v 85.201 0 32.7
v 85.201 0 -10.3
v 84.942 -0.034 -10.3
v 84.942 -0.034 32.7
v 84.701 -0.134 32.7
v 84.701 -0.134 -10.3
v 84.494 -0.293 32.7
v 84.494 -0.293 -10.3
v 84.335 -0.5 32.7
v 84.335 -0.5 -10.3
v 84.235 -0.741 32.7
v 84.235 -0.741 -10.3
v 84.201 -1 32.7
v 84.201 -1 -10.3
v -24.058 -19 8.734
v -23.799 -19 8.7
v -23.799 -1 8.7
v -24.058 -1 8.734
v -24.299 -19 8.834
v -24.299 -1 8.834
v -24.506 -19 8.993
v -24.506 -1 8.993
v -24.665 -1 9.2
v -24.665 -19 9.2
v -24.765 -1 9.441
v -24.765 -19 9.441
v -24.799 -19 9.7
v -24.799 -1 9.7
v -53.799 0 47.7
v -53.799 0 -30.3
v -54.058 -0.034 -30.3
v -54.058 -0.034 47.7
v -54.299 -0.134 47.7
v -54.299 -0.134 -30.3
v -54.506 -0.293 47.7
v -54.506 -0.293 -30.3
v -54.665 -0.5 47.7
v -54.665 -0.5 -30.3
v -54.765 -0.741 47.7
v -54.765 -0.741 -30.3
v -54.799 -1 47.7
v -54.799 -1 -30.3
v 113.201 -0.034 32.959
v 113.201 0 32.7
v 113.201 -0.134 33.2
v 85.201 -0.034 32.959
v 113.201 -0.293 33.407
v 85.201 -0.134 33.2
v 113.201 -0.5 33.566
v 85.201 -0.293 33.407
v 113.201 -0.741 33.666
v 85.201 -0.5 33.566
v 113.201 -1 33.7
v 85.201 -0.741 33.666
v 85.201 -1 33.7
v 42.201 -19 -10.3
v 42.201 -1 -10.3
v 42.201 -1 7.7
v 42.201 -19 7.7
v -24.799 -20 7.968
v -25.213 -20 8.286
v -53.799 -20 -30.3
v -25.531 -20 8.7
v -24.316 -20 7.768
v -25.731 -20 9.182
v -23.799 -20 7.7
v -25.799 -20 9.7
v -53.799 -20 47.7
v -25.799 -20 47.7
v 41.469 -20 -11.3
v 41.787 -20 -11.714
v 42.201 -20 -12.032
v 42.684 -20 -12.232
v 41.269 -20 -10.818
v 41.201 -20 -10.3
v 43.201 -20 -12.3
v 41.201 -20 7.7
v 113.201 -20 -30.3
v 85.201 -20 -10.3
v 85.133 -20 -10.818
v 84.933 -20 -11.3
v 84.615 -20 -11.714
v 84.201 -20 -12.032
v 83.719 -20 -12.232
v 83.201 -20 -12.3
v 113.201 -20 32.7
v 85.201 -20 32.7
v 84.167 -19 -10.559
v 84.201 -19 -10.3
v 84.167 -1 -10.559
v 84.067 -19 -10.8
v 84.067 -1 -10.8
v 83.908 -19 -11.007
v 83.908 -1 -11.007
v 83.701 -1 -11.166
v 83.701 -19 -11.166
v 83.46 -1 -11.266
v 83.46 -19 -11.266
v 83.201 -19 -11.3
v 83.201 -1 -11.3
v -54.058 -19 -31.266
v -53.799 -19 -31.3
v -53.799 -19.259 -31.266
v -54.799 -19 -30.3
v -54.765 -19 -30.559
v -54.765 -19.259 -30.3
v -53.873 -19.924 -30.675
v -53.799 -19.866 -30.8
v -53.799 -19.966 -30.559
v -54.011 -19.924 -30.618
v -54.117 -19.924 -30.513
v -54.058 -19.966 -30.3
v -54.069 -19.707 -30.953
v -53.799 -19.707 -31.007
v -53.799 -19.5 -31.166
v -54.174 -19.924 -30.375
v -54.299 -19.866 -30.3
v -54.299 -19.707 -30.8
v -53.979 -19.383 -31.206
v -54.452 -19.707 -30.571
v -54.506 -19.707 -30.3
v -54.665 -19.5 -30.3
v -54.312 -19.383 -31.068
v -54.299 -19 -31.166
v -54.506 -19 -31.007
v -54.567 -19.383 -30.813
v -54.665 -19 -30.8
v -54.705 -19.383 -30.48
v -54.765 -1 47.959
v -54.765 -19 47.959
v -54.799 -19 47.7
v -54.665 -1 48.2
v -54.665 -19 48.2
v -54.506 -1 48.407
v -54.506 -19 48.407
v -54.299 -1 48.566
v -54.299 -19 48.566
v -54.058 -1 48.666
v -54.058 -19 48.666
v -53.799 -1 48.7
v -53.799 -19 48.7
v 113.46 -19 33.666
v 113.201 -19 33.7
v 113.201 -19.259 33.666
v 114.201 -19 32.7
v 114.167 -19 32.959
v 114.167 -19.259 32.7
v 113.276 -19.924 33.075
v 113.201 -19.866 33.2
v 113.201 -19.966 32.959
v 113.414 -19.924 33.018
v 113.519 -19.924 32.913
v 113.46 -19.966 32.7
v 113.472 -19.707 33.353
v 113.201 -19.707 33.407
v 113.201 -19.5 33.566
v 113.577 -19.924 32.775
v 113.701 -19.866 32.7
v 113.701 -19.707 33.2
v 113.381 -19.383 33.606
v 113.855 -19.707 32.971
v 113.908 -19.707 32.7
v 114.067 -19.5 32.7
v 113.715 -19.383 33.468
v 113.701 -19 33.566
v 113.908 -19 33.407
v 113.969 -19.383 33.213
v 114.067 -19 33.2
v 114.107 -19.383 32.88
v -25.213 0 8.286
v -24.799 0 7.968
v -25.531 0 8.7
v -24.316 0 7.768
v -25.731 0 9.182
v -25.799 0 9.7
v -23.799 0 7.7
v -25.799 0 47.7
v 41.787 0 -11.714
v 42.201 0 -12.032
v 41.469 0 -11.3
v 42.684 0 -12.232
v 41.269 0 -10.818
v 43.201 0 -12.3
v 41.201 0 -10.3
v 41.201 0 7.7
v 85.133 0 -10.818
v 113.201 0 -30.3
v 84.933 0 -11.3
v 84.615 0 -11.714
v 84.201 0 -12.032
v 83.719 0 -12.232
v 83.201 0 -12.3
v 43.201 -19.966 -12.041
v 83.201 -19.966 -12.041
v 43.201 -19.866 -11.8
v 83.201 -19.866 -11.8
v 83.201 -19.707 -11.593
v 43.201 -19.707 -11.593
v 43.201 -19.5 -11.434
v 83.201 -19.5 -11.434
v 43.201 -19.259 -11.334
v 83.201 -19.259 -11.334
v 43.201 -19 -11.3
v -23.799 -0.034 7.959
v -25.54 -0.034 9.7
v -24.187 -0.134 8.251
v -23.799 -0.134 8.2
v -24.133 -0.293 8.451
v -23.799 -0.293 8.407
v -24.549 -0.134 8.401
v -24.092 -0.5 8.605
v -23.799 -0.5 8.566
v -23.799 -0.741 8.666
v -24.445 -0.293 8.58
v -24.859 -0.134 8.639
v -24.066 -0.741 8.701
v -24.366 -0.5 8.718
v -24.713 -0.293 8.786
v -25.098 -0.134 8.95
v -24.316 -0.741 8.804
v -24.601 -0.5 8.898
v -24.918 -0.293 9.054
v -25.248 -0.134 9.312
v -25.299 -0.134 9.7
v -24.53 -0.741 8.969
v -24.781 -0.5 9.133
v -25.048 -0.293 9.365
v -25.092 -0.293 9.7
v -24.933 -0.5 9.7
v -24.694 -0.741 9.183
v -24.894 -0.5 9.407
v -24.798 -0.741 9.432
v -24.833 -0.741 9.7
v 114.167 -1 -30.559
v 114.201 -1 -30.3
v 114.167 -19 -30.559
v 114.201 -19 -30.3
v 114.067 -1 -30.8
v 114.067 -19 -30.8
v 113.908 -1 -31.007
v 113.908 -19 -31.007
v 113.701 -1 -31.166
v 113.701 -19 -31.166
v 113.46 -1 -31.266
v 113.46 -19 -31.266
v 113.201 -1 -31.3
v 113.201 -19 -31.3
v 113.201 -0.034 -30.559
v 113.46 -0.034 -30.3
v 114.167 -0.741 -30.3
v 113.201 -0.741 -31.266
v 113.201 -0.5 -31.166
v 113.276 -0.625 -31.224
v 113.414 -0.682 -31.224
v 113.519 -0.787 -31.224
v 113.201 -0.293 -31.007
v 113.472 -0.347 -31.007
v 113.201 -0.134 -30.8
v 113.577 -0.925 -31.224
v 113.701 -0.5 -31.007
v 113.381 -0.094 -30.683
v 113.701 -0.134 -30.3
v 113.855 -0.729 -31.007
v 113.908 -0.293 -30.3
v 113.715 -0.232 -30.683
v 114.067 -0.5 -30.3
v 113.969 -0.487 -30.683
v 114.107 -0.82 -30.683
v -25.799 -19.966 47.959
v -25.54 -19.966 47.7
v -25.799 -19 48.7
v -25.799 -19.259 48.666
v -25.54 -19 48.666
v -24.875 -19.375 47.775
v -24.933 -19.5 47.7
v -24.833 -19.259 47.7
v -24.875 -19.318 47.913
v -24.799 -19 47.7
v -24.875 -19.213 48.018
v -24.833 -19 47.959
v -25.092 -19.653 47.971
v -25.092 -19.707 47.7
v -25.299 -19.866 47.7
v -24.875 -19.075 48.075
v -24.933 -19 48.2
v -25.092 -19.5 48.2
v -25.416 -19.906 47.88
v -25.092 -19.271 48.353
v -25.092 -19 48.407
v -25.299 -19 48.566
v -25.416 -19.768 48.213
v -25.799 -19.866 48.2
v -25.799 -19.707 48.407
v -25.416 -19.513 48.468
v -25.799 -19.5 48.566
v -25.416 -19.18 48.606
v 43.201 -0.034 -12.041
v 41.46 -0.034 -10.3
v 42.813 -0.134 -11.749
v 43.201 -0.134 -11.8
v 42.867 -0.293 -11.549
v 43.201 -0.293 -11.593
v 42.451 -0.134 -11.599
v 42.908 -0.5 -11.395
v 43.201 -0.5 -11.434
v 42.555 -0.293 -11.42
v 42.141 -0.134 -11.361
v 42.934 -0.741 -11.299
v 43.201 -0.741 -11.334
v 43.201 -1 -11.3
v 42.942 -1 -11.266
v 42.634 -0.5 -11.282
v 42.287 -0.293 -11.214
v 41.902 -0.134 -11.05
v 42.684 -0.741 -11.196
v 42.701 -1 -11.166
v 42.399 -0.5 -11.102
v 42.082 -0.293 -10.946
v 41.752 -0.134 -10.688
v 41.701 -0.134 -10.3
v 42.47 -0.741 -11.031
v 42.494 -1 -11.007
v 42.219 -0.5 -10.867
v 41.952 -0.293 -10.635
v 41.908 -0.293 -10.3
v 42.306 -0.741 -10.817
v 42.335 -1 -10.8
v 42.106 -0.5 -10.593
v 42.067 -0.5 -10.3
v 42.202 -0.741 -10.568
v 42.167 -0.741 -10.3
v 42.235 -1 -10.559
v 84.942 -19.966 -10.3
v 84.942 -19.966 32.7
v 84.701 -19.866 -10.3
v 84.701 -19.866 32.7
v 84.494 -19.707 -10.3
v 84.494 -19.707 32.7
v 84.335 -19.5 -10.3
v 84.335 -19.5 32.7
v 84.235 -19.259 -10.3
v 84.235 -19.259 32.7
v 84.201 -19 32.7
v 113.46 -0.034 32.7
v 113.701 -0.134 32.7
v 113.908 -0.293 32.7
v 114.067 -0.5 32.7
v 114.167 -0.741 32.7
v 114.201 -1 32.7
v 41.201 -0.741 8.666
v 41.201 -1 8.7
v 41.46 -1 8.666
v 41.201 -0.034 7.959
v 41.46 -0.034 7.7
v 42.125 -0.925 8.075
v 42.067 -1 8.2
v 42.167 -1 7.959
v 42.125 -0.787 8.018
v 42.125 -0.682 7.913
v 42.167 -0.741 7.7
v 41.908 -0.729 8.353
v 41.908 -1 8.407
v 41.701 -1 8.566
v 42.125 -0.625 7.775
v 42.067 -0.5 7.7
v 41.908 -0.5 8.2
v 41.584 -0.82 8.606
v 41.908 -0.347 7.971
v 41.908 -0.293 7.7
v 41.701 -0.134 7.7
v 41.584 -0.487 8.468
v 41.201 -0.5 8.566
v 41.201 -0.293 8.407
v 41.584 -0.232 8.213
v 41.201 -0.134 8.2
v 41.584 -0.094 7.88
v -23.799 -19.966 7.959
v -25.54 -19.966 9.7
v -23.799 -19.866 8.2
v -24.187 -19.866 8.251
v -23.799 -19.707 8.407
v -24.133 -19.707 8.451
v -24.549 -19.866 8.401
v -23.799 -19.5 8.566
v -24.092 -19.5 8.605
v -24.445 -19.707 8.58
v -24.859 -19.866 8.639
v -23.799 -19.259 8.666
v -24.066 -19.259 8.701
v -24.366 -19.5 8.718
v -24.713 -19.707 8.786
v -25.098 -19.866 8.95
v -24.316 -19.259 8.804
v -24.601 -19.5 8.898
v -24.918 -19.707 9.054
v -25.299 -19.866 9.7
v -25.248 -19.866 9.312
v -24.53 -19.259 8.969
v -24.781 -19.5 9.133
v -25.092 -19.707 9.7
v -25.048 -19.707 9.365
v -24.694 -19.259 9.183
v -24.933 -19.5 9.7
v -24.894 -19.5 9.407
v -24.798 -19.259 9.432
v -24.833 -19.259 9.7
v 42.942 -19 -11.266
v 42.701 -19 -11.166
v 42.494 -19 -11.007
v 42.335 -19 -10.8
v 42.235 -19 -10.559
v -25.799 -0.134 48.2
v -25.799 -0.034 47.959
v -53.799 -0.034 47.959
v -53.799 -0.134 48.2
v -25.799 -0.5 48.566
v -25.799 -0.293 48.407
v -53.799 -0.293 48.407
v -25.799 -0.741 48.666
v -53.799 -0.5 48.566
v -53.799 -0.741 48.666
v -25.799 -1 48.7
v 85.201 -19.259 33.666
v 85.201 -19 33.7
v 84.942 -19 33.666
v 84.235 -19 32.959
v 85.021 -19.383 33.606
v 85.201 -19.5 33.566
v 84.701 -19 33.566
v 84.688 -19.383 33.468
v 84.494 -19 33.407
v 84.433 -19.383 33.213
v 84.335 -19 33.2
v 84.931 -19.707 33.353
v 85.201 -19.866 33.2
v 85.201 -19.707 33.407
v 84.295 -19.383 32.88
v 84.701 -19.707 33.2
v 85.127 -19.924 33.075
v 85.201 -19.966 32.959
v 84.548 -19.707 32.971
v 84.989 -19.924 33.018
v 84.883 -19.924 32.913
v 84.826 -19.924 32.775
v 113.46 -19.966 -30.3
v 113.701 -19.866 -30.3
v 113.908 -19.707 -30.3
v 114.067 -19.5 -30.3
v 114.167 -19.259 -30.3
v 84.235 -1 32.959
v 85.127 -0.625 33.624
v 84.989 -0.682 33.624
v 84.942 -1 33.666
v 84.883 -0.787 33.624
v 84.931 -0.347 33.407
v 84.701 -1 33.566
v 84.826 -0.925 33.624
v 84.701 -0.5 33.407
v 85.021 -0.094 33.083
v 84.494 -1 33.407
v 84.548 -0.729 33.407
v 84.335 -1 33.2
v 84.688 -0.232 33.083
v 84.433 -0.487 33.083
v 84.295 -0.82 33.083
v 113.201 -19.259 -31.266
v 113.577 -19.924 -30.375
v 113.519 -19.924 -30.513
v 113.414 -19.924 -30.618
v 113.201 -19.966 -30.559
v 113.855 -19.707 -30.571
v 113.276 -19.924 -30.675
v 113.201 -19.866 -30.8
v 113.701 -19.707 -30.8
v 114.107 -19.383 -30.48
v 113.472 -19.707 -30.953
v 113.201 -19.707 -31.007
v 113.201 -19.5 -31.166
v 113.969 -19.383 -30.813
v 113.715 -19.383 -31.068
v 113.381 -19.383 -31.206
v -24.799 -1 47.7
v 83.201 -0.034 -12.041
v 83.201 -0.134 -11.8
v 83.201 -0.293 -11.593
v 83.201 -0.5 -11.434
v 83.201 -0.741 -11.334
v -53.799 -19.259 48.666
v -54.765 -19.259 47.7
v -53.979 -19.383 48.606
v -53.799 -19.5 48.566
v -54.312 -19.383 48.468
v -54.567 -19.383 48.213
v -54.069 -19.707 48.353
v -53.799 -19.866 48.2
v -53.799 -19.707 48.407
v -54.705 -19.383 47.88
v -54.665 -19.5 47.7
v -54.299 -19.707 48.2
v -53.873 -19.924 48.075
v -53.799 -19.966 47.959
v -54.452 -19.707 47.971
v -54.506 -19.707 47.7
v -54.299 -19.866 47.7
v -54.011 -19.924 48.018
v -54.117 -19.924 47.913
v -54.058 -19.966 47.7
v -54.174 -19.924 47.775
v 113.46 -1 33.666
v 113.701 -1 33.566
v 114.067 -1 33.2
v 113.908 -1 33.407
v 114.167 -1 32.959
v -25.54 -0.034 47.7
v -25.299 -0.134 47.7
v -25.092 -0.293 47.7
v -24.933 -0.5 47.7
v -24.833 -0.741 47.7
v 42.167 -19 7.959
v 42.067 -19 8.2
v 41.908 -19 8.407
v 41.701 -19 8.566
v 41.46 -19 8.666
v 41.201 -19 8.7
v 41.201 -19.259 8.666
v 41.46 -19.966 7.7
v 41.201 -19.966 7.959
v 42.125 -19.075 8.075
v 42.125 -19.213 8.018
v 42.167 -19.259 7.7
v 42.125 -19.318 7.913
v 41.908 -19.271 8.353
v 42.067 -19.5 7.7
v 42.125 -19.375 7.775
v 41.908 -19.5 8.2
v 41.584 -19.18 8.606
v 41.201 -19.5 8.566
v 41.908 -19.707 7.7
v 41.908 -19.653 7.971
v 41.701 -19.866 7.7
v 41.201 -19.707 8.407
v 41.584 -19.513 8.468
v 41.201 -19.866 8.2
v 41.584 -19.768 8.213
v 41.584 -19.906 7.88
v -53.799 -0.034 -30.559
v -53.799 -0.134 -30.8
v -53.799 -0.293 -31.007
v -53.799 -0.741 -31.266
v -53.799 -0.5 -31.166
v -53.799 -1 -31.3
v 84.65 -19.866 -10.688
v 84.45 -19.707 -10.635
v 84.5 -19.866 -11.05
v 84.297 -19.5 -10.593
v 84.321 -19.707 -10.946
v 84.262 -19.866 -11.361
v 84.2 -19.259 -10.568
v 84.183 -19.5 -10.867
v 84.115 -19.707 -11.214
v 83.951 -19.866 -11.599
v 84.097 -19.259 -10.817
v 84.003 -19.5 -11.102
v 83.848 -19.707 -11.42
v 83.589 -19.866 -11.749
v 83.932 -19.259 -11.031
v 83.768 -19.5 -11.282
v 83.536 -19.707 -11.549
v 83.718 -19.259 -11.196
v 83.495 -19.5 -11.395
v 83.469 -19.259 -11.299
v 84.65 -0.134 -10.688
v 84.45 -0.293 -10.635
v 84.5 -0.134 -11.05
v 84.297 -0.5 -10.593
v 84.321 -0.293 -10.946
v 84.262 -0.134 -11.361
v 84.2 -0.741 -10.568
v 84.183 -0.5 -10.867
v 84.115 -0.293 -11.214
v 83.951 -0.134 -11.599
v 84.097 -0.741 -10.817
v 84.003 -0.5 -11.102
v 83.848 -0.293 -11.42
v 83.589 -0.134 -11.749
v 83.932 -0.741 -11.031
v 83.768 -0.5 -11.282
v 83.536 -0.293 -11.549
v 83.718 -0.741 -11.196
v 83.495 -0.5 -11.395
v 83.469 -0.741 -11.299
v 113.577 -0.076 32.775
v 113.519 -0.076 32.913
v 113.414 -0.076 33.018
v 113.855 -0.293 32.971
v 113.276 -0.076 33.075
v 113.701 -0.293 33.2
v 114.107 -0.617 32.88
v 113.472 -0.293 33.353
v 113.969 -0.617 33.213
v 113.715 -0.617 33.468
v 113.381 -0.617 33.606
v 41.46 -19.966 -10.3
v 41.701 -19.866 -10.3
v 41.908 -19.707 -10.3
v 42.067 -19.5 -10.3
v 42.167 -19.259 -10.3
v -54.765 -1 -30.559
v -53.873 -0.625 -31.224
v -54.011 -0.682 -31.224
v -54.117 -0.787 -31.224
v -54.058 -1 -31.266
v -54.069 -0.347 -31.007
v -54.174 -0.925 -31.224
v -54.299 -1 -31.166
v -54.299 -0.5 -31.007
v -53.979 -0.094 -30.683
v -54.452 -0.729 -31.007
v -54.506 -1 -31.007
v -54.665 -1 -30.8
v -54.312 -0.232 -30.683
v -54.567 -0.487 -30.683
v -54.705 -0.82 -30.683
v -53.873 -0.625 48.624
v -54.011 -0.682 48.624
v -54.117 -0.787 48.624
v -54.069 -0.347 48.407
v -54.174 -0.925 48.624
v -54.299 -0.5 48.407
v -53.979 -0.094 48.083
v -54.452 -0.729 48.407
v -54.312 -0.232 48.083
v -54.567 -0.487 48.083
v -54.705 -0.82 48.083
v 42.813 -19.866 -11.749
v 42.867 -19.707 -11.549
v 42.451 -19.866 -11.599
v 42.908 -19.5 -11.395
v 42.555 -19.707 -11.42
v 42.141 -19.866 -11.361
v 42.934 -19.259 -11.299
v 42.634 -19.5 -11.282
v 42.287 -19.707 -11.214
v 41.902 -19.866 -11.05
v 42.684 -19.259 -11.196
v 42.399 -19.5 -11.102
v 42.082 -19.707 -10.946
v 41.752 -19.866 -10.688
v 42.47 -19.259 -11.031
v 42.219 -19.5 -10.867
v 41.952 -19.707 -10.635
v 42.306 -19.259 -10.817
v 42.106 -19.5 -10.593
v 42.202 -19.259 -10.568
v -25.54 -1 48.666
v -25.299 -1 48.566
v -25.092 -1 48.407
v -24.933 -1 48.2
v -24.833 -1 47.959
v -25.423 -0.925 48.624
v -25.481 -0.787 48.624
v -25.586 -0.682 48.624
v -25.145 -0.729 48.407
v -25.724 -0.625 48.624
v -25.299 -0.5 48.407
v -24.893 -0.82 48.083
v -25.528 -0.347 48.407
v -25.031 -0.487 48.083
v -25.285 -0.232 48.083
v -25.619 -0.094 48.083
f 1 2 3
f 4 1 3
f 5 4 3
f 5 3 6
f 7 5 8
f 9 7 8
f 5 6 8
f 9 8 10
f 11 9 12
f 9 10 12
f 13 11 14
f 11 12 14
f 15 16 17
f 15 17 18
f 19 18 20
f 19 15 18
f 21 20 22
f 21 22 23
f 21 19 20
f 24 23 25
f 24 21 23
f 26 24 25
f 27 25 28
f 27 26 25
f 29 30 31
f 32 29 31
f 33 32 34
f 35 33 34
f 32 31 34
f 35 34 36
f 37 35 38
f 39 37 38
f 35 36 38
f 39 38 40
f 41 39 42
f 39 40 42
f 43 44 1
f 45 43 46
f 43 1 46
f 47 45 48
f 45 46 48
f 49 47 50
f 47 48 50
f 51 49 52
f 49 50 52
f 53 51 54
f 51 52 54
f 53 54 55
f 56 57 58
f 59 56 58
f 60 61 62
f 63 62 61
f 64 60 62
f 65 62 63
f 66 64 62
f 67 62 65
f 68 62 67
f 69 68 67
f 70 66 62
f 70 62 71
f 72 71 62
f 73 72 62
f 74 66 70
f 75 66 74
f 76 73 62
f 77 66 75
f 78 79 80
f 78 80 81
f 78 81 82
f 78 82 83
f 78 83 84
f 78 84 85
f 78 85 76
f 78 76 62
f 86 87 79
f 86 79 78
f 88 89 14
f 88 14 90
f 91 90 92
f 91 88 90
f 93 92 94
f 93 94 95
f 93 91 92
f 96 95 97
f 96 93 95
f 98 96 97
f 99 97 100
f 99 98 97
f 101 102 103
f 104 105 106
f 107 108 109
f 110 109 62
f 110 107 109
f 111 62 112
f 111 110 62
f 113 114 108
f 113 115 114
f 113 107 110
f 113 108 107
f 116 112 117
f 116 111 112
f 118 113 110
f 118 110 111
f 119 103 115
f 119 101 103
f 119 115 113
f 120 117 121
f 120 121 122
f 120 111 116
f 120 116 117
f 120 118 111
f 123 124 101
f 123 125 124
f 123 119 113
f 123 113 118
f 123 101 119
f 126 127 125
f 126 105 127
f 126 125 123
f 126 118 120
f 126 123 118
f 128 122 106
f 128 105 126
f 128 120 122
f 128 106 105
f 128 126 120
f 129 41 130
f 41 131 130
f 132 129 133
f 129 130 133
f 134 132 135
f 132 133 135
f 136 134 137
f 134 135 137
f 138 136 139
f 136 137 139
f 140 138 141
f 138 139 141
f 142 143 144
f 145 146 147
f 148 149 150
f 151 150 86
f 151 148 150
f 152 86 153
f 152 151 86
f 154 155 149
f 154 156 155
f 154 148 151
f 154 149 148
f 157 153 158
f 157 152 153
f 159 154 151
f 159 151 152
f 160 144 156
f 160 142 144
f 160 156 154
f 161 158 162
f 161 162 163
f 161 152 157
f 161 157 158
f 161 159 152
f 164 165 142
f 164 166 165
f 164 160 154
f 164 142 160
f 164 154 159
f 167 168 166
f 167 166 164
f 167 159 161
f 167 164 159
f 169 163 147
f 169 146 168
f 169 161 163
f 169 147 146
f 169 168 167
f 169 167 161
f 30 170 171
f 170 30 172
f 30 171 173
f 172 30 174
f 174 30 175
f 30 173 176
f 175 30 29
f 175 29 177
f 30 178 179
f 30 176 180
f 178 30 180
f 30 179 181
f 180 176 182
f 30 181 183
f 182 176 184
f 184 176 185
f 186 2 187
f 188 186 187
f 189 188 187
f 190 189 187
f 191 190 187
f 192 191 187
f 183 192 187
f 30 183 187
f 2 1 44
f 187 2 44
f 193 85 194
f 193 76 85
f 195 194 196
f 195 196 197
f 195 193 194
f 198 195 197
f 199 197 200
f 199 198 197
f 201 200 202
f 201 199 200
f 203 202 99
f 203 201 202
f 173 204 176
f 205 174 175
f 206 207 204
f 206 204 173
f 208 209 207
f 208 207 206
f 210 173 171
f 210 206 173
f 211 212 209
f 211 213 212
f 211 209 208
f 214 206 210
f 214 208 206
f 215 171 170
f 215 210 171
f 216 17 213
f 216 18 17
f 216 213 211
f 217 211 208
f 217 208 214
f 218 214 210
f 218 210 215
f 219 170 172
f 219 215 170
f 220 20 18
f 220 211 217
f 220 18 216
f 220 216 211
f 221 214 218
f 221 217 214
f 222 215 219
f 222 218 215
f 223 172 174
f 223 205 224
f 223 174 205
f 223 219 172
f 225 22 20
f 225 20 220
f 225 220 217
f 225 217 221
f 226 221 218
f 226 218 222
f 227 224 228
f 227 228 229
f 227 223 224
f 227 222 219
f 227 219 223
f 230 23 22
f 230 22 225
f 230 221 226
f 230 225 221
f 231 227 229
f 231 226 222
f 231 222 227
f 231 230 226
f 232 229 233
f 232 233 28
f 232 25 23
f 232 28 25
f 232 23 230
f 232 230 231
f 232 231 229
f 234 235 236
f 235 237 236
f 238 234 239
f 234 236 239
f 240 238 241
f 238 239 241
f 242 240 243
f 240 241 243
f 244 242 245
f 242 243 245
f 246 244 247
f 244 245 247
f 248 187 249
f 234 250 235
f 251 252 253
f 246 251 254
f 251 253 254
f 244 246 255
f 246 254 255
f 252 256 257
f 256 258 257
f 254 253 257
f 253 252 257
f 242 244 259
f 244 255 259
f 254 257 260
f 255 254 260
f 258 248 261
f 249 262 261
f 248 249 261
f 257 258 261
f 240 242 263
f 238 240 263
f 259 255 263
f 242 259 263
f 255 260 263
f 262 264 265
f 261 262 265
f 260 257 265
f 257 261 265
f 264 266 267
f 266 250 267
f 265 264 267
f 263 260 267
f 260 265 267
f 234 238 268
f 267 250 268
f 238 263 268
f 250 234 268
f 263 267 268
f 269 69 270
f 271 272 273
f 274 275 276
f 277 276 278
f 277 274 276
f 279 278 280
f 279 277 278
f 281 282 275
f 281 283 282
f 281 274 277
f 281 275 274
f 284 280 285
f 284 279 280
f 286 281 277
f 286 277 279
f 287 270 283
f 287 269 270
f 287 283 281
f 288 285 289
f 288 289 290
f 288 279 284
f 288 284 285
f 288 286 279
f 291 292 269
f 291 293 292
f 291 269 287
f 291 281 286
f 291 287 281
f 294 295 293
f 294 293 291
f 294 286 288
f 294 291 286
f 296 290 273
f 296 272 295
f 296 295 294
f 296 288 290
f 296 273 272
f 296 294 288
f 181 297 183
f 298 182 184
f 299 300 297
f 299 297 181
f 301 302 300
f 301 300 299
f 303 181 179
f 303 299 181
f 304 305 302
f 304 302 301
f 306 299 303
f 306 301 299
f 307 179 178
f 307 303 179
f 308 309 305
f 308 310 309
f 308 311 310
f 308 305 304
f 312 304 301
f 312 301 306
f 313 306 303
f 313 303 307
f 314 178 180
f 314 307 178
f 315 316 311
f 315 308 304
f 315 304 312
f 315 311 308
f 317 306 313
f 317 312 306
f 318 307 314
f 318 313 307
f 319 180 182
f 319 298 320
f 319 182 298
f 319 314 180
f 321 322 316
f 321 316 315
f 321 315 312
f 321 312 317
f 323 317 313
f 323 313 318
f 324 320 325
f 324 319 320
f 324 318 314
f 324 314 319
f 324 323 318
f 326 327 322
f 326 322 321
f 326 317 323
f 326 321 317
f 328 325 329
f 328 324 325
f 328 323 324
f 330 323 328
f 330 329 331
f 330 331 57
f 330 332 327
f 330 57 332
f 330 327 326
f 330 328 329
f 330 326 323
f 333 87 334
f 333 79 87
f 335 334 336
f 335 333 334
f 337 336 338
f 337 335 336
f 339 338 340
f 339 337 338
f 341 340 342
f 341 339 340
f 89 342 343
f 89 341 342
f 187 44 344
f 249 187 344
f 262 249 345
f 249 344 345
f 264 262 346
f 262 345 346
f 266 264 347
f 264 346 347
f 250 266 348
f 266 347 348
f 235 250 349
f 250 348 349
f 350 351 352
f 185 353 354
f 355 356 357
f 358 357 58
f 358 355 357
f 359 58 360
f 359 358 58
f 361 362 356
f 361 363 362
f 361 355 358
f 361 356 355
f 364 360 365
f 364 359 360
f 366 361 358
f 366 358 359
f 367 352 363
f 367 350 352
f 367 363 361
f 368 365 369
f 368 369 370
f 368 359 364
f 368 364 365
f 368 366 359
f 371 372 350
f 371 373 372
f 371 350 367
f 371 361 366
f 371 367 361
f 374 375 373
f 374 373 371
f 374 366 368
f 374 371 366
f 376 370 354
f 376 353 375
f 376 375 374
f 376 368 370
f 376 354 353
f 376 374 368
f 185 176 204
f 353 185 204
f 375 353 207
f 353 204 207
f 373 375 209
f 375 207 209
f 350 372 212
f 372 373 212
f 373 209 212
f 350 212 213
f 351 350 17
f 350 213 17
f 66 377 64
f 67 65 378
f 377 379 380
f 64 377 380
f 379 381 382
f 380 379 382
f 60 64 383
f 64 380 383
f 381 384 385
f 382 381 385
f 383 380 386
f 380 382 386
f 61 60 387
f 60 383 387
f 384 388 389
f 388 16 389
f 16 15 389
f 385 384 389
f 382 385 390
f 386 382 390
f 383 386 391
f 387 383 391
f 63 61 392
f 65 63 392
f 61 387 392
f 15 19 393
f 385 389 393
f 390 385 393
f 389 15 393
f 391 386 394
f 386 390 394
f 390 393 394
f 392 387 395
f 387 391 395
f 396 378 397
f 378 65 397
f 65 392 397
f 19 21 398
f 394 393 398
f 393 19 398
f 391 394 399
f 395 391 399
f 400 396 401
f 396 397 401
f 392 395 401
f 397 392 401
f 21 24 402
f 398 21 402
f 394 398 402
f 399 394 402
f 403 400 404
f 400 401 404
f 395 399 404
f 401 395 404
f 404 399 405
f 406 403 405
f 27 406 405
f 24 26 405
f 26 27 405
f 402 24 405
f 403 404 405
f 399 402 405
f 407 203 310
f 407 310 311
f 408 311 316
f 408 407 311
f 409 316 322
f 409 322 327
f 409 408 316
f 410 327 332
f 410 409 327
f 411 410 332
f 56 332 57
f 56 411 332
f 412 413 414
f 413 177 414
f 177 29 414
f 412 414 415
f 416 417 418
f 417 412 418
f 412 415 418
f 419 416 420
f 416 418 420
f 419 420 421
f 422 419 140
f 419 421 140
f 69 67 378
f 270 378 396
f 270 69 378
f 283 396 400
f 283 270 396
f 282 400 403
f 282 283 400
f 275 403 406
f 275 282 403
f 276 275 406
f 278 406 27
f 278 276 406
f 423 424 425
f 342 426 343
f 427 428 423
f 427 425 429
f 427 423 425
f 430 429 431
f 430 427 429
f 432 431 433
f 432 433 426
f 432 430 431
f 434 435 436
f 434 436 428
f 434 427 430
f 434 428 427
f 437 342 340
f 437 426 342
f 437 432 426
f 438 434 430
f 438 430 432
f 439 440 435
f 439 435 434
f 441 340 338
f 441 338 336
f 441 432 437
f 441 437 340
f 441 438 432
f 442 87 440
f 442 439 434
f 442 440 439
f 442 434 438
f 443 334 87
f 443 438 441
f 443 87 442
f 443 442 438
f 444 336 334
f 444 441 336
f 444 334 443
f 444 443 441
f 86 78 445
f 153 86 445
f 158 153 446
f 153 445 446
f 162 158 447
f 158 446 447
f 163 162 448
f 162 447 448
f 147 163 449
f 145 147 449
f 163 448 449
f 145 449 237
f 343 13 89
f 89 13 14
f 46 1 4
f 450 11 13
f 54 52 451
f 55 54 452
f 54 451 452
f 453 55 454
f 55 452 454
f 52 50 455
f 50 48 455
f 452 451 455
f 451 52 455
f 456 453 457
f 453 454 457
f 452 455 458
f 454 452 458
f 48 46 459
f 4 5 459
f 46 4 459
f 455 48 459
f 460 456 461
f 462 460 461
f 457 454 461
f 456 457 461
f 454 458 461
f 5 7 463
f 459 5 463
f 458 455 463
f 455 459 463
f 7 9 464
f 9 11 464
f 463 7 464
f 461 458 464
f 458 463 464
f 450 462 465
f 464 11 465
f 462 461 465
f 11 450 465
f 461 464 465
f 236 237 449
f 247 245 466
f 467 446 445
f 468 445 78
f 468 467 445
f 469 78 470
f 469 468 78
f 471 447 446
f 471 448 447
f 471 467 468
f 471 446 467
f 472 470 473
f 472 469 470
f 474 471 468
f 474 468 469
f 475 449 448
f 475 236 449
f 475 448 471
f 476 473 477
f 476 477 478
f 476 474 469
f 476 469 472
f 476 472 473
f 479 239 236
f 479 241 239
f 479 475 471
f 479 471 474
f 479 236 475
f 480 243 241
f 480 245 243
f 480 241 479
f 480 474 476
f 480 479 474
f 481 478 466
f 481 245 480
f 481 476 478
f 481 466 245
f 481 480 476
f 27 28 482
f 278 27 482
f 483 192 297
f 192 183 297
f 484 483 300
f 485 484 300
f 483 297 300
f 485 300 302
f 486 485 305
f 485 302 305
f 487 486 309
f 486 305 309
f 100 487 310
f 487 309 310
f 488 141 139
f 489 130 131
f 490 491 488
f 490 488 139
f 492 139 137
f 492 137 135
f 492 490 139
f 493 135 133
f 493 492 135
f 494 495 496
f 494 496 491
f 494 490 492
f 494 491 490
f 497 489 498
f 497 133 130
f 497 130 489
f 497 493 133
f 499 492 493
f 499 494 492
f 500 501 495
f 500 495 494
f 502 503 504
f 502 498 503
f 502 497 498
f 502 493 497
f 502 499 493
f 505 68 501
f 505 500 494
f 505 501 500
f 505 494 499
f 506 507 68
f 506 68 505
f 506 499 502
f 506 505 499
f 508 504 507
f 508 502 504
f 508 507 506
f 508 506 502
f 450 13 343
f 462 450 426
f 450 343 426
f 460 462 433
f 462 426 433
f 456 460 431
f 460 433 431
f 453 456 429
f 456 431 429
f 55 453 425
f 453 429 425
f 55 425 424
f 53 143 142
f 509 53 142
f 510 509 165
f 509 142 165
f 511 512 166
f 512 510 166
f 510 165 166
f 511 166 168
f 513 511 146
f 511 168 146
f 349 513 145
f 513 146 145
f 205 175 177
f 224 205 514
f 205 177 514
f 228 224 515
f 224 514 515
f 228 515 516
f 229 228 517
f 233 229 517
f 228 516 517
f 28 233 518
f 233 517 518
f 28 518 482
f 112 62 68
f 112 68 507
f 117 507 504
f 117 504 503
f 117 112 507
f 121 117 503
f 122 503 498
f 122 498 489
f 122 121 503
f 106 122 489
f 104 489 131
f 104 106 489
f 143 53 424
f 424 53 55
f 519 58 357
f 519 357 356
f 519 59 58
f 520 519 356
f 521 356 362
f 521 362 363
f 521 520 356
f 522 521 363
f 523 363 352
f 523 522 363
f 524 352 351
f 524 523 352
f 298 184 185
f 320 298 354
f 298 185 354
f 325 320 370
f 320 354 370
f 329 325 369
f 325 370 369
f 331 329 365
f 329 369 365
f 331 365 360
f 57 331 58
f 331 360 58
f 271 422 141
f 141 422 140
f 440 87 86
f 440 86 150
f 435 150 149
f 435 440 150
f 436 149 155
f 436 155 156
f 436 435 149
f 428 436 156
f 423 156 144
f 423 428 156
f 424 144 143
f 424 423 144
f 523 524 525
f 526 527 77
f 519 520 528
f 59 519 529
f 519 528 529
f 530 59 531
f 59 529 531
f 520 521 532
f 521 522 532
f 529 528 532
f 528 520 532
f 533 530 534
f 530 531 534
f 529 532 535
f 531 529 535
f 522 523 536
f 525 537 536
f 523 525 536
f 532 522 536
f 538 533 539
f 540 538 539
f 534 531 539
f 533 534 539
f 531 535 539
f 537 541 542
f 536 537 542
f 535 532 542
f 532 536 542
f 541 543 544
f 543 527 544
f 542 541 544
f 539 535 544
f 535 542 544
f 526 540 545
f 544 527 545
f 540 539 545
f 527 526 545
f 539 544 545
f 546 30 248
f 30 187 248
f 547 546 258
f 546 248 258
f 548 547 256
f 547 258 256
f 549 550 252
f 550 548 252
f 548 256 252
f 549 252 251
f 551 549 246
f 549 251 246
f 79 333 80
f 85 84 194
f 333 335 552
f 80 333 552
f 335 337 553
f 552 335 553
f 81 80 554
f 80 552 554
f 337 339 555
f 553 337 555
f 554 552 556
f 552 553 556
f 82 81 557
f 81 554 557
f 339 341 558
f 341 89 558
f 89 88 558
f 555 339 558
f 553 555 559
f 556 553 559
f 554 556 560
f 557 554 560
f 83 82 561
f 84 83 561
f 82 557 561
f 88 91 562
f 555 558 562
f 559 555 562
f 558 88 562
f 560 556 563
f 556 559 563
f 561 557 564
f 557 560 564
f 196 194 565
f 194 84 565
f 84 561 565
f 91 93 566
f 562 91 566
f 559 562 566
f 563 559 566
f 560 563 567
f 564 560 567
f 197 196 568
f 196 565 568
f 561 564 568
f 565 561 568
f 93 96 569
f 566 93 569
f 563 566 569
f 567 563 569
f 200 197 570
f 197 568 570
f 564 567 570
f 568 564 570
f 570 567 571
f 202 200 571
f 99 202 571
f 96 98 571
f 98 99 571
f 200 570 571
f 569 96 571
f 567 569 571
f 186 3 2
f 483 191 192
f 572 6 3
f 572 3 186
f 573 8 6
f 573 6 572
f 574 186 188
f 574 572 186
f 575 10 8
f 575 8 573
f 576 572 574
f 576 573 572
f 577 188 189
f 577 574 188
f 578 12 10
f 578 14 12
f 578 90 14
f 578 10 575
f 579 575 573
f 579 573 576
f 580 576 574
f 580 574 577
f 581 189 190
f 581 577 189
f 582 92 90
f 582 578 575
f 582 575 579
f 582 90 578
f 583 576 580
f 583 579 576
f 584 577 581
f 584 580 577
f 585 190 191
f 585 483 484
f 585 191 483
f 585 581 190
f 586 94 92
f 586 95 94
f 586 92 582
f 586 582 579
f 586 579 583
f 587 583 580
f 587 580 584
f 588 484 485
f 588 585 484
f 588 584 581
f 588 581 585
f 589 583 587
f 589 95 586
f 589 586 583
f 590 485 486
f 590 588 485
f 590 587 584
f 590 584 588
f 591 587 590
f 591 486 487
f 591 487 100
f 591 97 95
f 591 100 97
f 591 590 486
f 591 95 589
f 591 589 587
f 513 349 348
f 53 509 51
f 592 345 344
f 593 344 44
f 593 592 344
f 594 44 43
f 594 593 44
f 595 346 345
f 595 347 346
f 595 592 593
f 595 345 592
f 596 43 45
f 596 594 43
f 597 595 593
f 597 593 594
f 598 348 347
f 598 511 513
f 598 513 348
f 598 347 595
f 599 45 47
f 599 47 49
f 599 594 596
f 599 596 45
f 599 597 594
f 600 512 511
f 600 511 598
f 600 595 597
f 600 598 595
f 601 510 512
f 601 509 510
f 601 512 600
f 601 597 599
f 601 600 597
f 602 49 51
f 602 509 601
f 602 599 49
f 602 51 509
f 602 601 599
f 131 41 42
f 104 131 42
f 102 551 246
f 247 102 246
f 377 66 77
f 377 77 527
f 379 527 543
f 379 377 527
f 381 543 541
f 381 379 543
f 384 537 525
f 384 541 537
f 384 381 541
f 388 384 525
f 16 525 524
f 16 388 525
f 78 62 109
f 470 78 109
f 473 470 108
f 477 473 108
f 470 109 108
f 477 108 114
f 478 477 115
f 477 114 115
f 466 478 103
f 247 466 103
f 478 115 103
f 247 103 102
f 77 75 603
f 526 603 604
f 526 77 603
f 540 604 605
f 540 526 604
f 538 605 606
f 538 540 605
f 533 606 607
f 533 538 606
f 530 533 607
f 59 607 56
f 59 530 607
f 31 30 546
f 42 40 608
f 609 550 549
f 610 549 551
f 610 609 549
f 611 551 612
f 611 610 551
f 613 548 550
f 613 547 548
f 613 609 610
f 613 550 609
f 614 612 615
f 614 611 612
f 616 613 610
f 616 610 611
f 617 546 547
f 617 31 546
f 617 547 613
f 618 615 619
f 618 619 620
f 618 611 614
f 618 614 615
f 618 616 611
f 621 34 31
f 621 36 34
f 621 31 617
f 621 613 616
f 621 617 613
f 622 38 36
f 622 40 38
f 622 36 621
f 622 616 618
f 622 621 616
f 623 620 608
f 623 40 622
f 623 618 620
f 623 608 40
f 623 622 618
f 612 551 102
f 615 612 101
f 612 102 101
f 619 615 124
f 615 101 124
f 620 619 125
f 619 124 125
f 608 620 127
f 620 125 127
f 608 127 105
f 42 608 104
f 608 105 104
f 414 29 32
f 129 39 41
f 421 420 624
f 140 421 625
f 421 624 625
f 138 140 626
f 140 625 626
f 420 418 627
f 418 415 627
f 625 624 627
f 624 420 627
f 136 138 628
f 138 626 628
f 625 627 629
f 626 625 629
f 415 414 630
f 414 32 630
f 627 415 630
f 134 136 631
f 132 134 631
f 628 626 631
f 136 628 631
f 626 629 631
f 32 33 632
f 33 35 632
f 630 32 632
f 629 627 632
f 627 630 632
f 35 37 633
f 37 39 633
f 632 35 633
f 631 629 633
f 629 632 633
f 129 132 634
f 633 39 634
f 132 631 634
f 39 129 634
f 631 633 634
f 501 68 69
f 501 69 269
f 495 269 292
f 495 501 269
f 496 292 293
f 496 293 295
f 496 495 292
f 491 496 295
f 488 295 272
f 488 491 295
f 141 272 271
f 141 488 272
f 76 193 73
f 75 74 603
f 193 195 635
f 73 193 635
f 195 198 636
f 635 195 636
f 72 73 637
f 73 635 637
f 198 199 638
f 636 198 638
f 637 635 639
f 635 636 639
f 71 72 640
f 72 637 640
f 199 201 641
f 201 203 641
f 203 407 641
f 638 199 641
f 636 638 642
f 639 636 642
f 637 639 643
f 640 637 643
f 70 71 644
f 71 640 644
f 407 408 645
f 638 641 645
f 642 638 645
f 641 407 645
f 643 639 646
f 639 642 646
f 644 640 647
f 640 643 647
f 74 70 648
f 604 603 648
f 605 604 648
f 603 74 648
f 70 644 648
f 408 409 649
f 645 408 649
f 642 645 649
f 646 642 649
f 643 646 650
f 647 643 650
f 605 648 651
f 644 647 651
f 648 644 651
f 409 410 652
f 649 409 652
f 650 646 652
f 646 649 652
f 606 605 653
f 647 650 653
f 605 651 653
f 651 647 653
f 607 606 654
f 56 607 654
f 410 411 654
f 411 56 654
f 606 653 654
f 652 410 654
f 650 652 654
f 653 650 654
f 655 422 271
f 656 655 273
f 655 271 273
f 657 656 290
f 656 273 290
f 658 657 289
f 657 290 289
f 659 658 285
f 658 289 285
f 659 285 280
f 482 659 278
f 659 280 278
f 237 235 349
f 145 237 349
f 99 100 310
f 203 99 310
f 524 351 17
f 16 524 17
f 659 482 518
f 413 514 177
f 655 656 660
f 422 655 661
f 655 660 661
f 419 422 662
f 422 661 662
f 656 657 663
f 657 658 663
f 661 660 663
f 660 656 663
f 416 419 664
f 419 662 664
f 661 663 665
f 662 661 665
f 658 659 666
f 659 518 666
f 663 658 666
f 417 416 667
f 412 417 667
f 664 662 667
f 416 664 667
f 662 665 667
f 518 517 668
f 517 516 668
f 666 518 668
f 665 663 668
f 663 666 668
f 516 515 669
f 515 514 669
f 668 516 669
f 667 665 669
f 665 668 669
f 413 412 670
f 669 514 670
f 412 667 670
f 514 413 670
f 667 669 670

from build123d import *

# Parameters (mm, degrees)
F1_DEPTH     = 20
F2_F1_R      = 1
F2_F2_R      = 1
F3_T1_DEPTH  = 63
F3_T3_DEPTH  = 28
F3_T5_DEPTH  = 167
F3_T7_DEPTH  = 78
F3_S11_W     = 1
F3_S11_H     = 1
F3_T12_DEPTH = 1
F3_S17_W     = 1
F3_S17_H     = 1
F3_T18_DEPTH = 1
F3_T22_ANGLE = 90
F3_T24_ANGLE = 90
F3_T26_ANGLE = 90


# Not quite as in the source:
# - a fillet or chamfer that OpenCascade refuses, or shapes differently, is made with other operations: its cross-section is extruded or revolved along the edge and cut away or added


with BuildPart() as f1:
    # F0 (on Front) → F1 (new body)
    with BuildSketch(Plane.XZ):
        Polygon((-54.7987632453, 48.7000103295), (-54.7987632453, -31.2999896705), (114.2012367547, -31.2999896705), (114.2012367547, 33.7000103295), (84.2012367547, 33.7000103295), (84.2012367547, -11.2999896705), (42.2012367547, -11.2999896705), (42.2012367547, 8.7000103295), (-24.7987632453, 8.7000103295), (-24.7987632453, 48.7000103295), align=None)
    extrude(amount=F1_DEPTH)

    # F2: fillet of radius 1 on 24 edges, made by hand

    # F2_f1
    f2_f1_edges = [f1.edges().sort_by_distance(p)[0] for p in [
        (-24.7987632453, -10, 8.7000103295),
        (84.2012367547, -10, -11.2999896705),
        (42.2012367547, -10, -11.2999896705),
    ]]
    fillet(f2_f1_edges, radius=F2_F1_R)

    # F2_f2
    f2_f2_edges = [f1.edges().sort_by_distance(p)[0] for p in [
        (-39.7987632453, -20, 48.7000103295),
        (9.2012367547, -20, 8.7000103295),
        (-24.7987632453, -20, 29.2000103295),
        (9.2012367547, 0, 8.7000103295),
        (-24.7987632453, -10, 48.7000103295),
        (42.2012367547, -10, 8.7000103295),
        (42.2012367547, -20, -0.7999896705),
        (63.2012367547, 0, -11.2999896705),
        (63.2012367547, -20, -11.2999896705),
        (114.2012367547, -10, 33.7000103295),
        (114.2012367547, 0, 1.2000103295),
        (99.2012367547, 0, 33.7000103295),
        (84.2012367547, 0, 11.7000103295),
        (-54.7987632453, 0, 8.7000103295),
        (29.7012367547, 0, -31.2999896705),
        (-54.7987632453, -10, -31.2999896705),
        (84.2012367547, -10, 33.7000103295),
        (-24.7987632453, 0, 29.2000103295),
        (-39.7987632453, 0, 48.7000103295),
        (114.2012367547, -10, -31.2999896705),
        (-54.7987632453, -10, 48.7000103295),
        (-24.5058700265, 0, 8.9929035483),
        (83.9083435358, 0, -11.0070964517),
        (83.9083435358, -20, -11.0070964517),
        (42.4941299735, -20, -11.0070964517),
        (42.4941299735, 0, -11.0070964517),
        (-24.5058700265, -20, 8.9929035483),
    ]]
    fillet(f2_f2_edges, radius=F2_F2_R)

    # F3: fillet of radius 1 on 7 edges, made by hand

    # F3_s2 → F3_t1 (cut)
    with BuildSketch(Plane.XY.offset(-30.2999896705)):
        with BuildLine():
            ThreePointArc((113.2012367547, -20), (113.9083435358, -19.7071067812), (114.2012367547, -19))
            Line((114.2012367547, -19), (114.2012367547, -20))
            Line((114.2012367547, -20), (113.2012367547, -20))
        make_face()
    extrude(amount=F3_T1_DEPTH, mode=Mode.SUBTRACT)

    # F3_s4 → F3_t3 (cut)
    with BuildSketch(Plane.YZ.offset(85.2012367547)):
        with BuildLine():
            ThreePointArc((-20, 32.7000103295), (-19.7071067812, 33.4071171107), (-19, 33.7000103295))
            Line((-19, 33.7000103295), (-20, 33.7000103295))
            Line((-20, 33.7000103295), (-20, 32.7000103295))
        make_face()
    extrude(amount=F3_T3_DEPTH, mode=Mode.SUBTRACT)

    # F3_s6 → F3_t5 (cut)
    with BuildSketch(Plane.YZ.offset(-53.7987632453)):
        with BuildLine():
            ThreePointArc((-20, -30.2999896705), (-19.7071067812, -31.0070964517), (-19, -31.2999896705))
            Line((-19, -31.2999896705), (-20, -31.2999896705))
            Line((-20, -31.2999896705), (-20, -30.2999896705))
        make_face()
    extrude(amount=F3_T5_DEPTH, mode=Mode.SUBTRACT)

    # F3_s8 → F3_t7 (cut)
    with BuildSketch(Plane.XY.offset(-30.2999896705)):
        with BuildLine():
            ThreePointArc((-53.7987632453, -20), (-54.5058700265, -19.7071067812), (-54.7987632453, -19))
            Line((-54.7987632453, -19), (-54.7987632453, -20))
            Line((-54.7987632453, -20), (-53.7987632453, -20))
        make_face()
    extrude(amount=F3_T7_DEPTH, mode=Mode.SUBTRACT)


with BuildPart() as f3_tool10:
    # F3_s11 → F3_t12 (new body)
    with BuildSketch(Plane.XZ.offset(19)):
        with Locations((-54.2987632453, 48.2000103295)):
            Rectangle(F3_S11_W, F3_S11_H)
    extrude(amount=F3_T12_DEPTH)

    # F3_s13 → F3_t14 (revolve, cut)
    with BuildSketch(Plane(origin=(-53.7987632453, -19, 47.7000103295), x_dir=(0.7071067812, 0, -0.7071067812), z_dir=(-0.7071067812, 0, -0.7071067812))):
        with BuildLine():
            ThreePointArc((0, -1), (1, 0), (0, 1))
            Line((0, 1), (0, -1))
        make_face()
    revolve(axis=Axis((-53.7987632453, -19, 47.7000103295), (0, -1, 0)), mode=Mode.SUBTRACT)


with BuildPart() as f1_1:
    add(f1.part)

    # F3_t9: cut F3_tool10
    add(f3_tool10.part, mode=Mode.SUBTRACT)


with BuildPart() as f3_tool16:
    # F3_s17 → F3_t18 (new body)
    with BuildSketch(Plane.XZ.offset(19)):
        with Locations((84.7012367547, 33.2000103295)):
            Rectangle(F3_S17_W, F3_S17_H)
    extrude(amount=F3_T18_DEPTH)

    # F3_s19 → F3_t20 (revolve, cut)
    with BuildSketch(Plane(origin=(85.2012367547, -19, 32.7000103295), x_dir=(0.7071067812, 0, -0.7071067812), z_dir=(-0.7071067812, 0, -0.7071067812))):
        with BuildLine():
            ThreePointArc((0, -1), (1, 0), (0, 1))
            Line((0, 1), (0, -1))
        make_face()
    revolve(axis=Axis((85.2012367547, -19, 32.7000103295), (0, -1, 0)), mode=Mode.SUBTRACT)


with BuildPart() as f1_2:
    add(f1_1.part)

    # F3_t15: cut F3_tool16
    add(f3_tool16.part, mode=Mode.SUBTRACT)

    # F3_s21 → F3_t22 (revolve, cut)
    with BuildSketch(Plane.YZ.offset(113.2012367547)):
        with BuildLine():
            ThreePointArc((-20, 32.7000103295), (-19.7071067812, 33.4071171107), (-19, 33.7000103295))
            Line((-19, 33.7000103295), (-20, 33.7000103295))
            Line((-20, 33.7000103295), (-20, 32.7000103295))
        make_face()
    revolve(axis=Axis((113.2012367547, -20, 32.7000103295), (0, 1, 0)), revolution_arc=F3_T22_ANGLE, mode=Mode.SUBTRACT)

    # F3_s23 → F3_t24 (revolve, cut)
    with BuildSketch(Plane.XY.offset(-30.2999896705)):
        with BuildLine():
            ThreePointArc((113.2012367547, -20), (113.9083435358, -19.7071067812), (114.2012367547, -19))
            Line((114.2012367547, -19), (114.2012367547, -20))
            Line((114.2012367547, -20), (113.2012367547, -20))
        make_face()
    revolve(axis=Axis((113.2012367547, -20, -30.2999896705), (0, 1, 0)), revolution_arc=F3_T24_ANGLE, mode=Mode.SUBTRACT)

    # F3_s25 → F3_t26 (revolve, cut)
    with BuildSketch(Plane.YZ.offset(-53.7987632453)):
        with BuildLine():
            ThreePointArc((-20, -30.2999896705), (-19.7071067812, -31.0070964517), (-19, -31.2999896705))
            Line((-19, -31.2999896705), (-20, -31.2999896705))
            Line((-20, -31.2999896705), (-20, -30.2999896705))
        make_face()
    revolve(axis=Axis((-53.7987632453, -20, -30.2999896705), (0, 1, 0)), revolution_arc=F3_T26_ANGLE, mode=Mode.SUBTRACT)


solid = f1_2.part
